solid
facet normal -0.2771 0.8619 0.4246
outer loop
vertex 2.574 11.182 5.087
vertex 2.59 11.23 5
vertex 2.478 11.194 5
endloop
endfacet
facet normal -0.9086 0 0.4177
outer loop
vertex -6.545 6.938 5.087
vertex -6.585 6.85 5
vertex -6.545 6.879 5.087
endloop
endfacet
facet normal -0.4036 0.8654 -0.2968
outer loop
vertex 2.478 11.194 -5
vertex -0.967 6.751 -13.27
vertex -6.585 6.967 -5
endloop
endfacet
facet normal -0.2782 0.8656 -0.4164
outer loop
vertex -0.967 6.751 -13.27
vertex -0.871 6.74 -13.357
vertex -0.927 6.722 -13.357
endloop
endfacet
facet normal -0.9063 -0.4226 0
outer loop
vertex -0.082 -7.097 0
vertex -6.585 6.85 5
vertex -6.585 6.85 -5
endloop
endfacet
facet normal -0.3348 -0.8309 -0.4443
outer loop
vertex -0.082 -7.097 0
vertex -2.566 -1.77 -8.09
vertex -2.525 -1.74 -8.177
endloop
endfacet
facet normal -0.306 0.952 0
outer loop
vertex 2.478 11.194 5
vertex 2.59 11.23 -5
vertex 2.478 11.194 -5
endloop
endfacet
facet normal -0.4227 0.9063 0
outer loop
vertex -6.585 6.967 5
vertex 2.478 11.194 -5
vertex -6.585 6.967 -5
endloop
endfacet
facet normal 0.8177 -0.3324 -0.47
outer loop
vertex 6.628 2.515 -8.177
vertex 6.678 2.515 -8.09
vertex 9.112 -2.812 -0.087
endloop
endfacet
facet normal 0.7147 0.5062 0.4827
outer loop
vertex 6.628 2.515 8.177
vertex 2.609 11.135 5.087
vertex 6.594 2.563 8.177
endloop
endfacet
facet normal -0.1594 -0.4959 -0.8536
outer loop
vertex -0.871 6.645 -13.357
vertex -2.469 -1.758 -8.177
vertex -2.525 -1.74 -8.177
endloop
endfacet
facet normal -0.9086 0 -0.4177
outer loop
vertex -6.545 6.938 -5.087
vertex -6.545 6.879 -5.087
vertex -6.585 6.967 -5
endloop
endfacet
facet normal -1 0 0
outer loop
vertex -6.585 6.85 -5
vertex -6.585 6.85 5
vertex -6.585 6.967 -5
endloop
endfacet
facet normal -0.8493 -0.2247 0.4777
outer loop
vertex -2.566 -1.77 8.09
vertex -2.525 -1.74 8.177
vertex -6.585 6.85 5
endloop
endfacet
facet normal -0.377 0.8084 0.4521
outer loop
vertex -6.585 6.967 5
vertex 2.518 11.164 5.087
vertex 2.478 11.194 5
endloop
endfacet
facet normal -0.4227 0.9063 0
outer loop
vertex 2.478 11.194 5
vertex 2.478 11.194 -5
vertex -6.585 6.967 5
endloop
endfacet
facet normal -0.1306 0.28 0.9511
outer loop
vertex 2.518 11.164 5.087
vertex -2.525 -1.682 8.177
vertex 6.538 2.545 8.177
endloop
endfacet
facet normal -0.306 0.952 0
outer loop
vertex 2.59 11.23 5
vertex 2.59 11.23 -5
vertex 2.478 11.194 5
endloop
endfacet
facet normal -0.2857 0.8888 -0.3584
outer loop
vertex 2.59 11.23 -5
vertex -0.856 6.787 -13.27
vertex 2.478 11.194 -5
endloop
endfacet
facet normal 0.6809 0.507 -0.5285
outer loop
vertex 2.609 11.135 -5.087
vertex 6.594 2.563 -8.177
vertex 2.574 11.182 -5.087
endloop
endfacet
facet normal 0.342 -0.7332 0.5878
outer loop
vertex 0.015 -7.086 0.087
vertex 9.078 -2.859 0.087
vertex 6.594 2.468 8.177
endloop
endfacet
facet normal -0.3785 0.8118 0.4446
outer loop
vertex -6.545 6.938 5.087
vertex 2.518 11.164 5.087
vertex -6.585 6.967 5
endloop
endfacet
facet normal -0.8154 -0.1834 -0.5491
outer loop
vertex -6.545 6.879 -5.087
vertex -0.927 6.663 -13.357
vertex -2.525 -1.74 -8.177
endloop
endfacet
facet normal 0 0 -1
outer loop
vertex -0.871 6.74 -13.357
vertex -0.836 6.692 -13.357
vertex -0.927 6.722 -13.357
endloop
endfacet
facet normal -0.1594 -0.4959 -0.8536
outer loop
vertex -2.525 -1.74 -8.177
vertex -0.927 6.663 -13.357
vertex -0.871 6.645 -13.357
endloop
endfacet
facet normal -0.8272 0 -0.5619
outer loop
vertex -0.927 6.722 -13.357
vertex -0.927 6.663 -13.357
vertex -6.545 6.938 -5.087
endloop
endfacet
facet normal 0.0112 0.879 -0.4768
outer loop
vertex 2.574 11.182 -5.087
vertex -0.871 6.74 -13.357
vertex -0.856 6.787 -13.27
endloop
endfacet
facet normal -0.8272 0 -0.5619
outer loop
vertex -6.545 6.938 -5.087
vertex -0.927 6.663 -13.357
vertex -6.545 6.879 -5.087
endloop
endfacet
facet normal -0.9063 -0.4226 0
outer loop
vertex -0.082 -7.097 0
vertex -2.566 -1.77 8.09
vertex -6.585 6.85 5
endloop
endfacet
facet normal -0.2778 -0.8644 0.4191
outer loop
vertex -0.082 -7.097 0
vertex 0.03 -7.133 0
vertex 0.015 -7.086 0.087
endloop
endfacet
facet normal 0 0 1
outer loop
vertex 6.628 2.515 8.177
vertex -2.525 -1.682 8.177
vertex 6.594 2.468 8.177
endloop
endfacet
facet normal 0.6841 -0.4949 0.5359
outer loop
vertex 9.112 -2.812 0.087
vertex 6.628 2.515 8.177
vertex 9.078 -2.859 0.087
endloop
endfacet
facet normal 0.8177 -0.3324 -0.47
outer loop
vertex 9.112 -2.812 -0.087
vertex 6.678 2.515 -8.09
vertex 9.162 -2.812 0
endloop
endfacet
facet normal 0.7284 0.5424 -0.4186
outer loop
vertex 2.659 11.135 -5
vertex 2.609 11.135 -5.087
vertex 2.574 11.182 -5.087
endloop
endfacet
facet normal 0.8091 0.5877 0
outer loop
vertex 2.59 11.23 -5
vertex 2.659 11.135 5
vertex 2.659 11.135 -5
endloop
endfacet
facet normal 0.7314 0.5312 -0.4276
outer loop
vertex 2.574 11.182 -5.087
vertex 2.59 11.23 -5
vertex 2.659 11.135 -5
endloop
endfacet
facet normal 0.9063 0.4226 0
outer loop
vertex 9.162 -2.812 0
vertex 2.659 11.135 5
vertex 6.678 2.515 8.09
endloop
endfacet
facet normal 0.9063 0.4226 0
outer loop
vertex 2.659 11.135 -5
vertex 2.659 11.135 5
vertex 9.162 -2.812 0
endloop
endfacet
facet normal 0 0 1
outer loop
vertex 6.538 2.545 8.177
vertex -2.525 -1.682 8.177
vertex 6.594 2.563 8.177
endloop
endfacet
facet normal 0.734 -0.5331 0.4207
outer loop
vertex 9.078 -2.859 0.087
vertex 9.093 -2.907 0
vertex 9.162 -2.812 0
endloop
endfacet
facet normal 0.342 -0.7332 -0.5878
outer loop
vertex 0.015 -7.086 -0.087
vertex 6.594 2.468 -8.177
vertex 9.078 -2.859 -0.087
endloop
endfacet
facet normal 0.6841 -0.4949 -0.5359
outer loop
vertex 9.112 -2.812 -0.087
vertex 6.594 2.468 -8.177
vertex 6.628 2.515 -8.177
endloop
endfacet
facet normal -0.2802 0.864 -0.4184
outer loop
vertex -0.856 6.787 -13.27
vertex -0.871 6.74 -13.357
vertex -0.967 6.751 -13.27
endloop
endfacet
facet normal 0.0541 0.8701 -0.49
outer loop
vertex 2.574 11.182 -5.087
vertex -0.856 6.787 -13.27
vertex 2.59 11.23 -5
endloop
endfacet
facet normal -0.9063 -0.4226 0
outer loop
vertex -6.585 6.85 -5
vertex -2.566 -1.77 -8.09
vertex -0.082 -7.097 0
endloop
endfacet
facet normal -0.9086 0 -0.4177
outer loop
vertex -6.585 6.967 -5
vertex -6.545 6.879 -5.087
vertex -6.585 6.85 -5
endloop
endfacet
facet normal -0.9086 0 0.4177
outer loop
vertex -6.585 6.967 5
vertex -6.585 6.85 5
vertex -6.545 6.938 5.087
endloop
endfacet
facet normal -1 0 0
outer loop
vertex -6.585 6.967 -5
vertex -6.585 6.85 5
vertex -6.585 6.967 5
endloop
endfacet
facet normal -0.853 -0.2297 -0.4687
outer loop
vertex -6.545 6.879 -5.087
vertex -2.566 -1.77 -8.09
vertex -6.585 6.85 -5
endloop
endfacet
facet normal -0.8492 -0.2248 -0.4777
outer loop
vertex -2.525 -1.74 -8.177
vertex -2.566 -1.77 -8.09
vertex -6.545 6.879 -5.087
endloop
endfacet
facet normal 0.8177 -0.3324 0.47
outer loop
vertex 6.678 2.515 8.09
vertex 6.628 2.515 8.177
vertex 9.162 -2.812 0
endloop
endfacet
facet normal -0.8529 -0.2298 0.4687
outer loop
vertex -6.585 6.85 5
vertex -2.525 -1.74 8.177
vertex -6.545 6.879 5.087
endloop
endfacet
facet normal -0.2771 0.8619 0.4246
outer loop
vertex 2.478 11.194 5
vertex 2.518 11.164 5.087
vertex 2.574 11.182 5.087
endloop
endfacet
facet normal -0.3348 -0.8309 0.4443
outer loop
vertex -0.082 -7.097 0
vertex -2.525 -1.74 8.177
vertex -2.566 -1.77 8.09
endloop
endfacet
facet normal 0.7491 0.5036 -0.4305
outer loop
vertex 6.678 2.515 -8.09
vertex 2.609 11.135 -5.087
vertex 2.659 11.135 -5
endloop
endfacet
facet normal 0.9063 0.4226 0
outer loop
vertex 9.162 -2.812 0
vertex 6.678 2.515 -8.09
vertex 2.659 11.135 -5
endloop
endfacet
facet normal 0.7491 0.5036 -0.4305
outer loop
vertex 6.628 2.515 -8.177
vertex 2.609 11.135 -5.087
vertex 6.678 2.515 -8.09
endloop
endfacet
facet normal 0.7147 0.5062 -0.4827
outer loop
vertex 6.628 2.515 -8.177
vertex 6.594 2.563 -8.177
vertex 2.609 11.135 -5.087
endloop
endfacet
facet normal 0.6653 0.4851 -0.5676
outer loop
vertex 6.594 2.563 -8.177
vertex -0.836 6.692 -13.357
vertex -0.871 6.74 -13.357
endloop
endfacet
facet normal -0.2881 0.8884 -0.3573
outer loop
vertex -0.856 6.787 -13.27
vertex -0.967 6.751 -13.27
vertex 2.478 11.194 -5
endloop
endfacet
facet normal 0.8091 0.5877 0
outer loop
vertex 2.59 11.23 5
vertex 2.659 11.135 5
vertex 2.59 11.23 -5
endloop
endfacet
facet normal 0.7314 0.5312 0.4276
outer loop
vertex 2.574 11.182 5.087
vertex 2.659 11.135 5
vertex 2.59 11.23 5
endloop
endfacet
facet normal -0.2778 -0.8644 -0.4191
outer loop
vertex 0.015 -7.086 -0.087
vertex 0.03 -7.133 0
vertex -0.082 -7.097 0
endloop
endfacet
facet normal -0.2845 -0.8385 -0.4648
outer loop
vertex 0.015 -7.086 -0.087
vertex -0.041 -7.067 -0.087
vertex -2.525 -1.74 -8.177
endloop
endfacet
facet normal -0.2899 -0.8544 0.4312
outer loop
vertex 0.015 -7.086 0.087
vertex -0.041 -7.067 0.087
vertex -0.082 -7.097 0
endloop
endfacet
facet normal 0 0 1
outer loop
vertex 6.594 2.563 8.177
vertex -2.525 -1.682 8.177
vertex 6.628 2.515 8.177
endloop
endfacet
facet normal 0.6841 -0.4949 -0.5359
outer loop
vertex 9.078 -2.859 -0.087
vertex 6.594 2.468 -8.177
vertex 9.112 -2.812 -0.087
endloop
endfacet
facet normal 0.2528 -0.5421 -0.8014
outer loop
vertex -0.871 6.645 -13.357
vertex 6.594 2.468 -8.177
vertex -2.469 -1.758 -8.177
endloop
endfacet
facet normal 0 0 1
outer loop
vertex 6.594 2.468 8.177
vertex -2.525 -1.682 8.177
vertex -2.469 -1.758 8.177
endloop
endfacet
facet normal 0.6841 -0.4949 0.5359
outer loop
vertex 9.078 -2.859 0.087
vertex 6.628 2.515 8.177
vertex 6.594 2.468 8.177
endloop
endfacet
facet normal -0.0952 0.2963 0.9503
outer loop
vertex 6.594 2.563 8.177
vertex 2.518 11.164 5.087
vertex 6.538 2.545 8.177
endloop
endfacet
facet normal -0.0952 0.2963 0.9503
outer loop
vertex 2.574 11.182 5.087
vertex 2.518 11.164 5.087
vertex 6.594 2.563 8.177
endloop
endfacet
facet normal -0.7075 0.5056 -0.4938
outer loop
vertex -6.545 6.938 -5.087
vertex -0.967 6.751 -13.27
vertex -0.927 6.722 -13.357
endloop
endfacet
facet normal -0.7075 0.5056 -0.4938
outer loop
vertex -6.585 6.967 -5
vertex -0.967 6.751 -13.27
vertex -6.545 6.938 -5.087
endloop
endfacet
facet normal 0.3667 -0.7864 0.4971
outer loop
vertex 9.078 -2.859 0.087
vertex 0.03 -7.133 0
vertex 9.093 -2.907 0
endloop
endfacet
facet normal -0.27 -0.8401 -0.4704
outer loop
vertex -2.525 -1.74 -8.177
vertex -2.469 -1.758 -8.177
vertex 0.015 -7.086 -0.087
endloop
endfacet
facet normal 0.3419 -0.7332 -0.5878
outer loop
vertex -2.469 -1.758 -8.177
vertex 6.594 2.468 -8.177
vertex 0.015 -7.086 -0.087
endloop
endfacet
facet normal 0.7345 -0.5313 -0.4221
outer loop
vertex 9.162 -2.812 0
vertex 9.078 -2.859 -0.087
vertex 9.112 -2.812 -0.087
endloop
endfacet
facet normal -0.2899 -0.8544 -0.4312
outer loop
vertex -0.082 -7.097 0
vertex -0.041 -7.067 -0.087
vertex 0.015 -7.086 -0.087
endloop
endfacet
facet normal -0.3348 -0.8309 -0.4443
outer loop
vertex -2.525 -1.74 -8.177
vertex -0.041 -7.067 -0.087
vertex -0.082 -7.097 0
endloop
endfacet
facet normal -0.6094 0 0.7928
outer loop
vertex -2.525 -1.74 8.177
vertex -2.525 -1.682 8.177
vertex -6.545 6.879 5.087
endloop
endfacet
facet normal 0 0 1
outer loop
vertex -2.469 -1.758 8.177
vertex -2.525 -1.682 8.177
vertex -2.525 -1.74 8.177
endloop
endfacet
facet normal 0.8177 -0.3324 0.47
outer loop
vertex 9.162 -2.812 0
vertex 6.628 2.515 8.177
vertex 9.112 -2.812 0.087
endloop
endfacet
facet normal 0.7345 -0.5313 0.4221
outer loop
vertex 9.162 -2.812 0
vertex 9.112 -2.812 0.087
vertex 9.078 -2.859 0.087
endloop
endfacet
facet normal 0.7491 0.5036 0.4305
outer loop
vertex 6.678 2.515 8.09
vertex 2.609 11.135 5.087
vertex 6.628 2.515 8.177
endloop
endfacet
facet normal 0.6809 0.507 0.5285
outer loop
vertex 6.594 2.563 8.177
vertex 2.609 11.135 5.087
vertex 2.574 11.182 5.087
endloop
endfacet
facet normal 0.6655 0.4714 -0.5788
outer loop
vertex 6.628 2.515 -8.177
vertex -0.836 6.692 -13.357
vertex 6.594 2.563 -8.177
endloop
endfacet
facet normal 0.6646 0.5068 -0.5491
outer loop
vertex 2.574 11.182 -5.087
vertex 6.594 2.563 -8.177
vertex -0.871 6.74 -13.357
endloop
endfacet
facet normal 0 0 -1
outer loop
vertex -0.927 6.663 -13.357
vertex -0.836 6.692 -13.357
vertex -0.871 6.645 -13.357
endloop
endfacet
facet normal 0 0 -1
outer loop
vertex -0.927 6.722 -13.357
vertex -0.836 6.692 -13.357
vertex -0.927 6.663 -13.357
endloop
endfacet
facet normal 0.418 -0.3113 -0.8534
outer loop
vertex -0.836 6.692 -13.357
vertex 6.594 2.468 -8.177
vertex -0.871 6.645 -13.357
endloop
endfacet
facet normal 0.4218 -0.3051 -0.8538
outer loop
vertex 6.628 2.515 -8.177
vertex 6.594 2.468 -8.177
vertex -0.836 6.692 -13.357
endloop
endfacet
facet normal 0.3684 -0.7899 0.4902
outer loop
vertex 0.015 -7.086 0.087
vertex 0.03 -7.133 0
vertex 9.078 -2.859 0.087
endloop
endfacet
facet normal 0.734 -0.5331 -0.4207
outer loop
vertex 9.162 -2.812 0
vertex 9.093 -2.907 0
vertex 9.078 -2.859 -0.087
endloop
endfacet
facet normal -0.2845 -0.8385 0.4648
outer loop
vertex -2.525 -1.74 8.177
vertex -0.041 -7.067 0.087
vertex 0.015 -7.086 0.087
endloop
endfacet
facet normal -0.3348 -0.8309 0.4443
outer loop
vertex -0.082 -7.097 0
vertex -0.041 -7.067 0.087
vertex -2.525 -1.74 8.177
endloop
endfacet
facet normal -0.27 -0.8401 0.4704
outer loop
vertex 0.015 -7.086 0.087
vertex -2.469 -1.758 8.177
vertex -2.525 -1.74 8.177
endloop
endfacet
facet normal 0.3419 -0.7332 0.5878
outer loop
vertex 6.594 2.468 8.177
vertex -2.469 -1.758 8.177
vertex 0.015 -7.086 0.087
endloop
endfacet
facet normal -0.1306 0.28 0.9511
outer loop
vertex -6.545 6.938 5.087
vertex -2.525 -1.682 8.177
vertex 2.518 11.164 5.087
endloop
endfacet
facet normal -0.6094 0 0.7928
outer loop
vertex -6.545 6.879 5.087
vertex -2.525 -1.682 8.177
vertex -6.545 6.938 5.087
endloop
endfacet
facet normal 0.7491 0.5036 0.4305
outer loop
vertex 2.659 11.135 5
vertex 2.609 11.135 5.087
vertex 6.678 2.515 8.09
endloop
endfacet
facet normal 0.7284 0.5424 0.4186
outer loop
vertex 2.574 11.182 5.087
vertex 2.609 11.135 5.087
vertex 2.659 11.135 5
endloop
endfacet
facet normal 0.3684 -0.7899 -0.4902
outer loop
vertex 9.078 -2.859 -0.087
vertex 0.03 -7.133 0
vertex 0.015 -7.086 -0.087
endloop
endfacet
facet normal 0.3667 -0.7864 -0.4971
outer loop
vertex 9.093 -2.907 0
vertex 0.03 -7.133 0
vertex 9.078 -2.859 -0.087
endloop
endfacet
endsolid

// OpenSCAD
// Auto-generated OpenSCAD file

    inner_points = 10*[[0.2558824559881848, 1.1134809877530691, 0.5000000000030929], [-0.6504210229442514, 0.6908534873760076, 0.50000000000051], [0.9062393061228075, -0.28117666064270774, -9.353628982466944e-13], [-6.41728096287264e-05, -0.7038041610197694, -3.518157987159043e-12], [0.25588245598941933, 1.1134809877565333, -0.49999999999690703], [-0.6504210229430168, 0.6908534873794716, -0.49999999999948996], [0.6578250941889378, 0.2515351583779428, -0.809016994374344], [-0.24847838474349848, -0.17109234199911882, -0.809016994376927], [0.6578250941869402, 0.251535158372338, 0.8090169943755507], [-0.248478384745496, -0.17109234200472362, 0.8090169943729678], [-0.08864545939497245, 0.6692288945346313, -1.3270070091503023]];

    outer_points = 10*[[0.939271150352653, -0.2914253703744584, 0.0802979287858217], [0.35569526368517285, -0.23342057046774728, 0.8902822667134429], [-0.3735213820712076, -0.2914253703744584, -0.865540194553496], [-0.9570972687386876, -0.23342057046774728, -0.05555585662587481], [0.7207978378522963, 0.6580298560378001, -0.14509990785767551], [0.13722195118481623, 0.7160346559445111, 0.6648844300699457], [-0.09055256736269784, 0.6580298560378001, -0.729660015936789], [-0.674128454030178, 0.7160346559445111, 0.08032432199083217], [0.2629446778976564, -0.8782209710934609, -0.36495865525691407], [-0.3206312087698237, -0.8202161711867498, 0.44502568267070713], [0.04731076808846265, 1.3929484844445685, -0.06566580635435994]];

    // Convex hull for inner set (I)
    module inner_hull() {
        hull() {
            for (p = inner_points) {
                translate(p) sphere(r=0.1);
            }
        }
    }

    // Convex hull for outer set (O) minus inner hull (O \ I)
    module outer_minus_inner() {
        difference() {
            hull() {
                for (p = outer_points) {
                    translate(p) sphere(r=0.1);
                }
            }
            inner_hull(); // Subtract inner hull
        }
    }

    // Convex hull for outer set (O) minus all translated inner hulls
    module outer_minus_AllTranslationInner() {
        difference() {
            hull() {
                for (p = outer_points) {
                    translate(p) sphere(r=0.1);
                }
            }
            hull() {
                translate([0,0,50]) inner_hull();
                translate([0,0,-50]) inner_hull();
            }; // Subtract translated inner hulls
        }
    }

    // Difference between outer_minus_inner and outer_minus_AllTranslationInner
    module outer_minus_inner_diff() {
        difference() {
            // Outer minus inner
            difference() {
                hull() {
                    for (p = outer_points) {
                        translate(p) sphere(r=0.1);
                    }
                }
                inner_hull();
            }

            // Subtract Outer minus AllTranslationInner
            difference() {
                hull() {
                    for (p = outer_points) {
                        translate(p) sphere(r=0.1);
                    }
                }
                hull() {
                    translate([0,0,50]) inner_hull();
                    translate([0,0,-50]) inner_hull();
                };
            }
        }
    }

    // Rendering all with colors applied
    color([1, 0, 0, 0.5]) inner_hull(); // Transparent red
    
